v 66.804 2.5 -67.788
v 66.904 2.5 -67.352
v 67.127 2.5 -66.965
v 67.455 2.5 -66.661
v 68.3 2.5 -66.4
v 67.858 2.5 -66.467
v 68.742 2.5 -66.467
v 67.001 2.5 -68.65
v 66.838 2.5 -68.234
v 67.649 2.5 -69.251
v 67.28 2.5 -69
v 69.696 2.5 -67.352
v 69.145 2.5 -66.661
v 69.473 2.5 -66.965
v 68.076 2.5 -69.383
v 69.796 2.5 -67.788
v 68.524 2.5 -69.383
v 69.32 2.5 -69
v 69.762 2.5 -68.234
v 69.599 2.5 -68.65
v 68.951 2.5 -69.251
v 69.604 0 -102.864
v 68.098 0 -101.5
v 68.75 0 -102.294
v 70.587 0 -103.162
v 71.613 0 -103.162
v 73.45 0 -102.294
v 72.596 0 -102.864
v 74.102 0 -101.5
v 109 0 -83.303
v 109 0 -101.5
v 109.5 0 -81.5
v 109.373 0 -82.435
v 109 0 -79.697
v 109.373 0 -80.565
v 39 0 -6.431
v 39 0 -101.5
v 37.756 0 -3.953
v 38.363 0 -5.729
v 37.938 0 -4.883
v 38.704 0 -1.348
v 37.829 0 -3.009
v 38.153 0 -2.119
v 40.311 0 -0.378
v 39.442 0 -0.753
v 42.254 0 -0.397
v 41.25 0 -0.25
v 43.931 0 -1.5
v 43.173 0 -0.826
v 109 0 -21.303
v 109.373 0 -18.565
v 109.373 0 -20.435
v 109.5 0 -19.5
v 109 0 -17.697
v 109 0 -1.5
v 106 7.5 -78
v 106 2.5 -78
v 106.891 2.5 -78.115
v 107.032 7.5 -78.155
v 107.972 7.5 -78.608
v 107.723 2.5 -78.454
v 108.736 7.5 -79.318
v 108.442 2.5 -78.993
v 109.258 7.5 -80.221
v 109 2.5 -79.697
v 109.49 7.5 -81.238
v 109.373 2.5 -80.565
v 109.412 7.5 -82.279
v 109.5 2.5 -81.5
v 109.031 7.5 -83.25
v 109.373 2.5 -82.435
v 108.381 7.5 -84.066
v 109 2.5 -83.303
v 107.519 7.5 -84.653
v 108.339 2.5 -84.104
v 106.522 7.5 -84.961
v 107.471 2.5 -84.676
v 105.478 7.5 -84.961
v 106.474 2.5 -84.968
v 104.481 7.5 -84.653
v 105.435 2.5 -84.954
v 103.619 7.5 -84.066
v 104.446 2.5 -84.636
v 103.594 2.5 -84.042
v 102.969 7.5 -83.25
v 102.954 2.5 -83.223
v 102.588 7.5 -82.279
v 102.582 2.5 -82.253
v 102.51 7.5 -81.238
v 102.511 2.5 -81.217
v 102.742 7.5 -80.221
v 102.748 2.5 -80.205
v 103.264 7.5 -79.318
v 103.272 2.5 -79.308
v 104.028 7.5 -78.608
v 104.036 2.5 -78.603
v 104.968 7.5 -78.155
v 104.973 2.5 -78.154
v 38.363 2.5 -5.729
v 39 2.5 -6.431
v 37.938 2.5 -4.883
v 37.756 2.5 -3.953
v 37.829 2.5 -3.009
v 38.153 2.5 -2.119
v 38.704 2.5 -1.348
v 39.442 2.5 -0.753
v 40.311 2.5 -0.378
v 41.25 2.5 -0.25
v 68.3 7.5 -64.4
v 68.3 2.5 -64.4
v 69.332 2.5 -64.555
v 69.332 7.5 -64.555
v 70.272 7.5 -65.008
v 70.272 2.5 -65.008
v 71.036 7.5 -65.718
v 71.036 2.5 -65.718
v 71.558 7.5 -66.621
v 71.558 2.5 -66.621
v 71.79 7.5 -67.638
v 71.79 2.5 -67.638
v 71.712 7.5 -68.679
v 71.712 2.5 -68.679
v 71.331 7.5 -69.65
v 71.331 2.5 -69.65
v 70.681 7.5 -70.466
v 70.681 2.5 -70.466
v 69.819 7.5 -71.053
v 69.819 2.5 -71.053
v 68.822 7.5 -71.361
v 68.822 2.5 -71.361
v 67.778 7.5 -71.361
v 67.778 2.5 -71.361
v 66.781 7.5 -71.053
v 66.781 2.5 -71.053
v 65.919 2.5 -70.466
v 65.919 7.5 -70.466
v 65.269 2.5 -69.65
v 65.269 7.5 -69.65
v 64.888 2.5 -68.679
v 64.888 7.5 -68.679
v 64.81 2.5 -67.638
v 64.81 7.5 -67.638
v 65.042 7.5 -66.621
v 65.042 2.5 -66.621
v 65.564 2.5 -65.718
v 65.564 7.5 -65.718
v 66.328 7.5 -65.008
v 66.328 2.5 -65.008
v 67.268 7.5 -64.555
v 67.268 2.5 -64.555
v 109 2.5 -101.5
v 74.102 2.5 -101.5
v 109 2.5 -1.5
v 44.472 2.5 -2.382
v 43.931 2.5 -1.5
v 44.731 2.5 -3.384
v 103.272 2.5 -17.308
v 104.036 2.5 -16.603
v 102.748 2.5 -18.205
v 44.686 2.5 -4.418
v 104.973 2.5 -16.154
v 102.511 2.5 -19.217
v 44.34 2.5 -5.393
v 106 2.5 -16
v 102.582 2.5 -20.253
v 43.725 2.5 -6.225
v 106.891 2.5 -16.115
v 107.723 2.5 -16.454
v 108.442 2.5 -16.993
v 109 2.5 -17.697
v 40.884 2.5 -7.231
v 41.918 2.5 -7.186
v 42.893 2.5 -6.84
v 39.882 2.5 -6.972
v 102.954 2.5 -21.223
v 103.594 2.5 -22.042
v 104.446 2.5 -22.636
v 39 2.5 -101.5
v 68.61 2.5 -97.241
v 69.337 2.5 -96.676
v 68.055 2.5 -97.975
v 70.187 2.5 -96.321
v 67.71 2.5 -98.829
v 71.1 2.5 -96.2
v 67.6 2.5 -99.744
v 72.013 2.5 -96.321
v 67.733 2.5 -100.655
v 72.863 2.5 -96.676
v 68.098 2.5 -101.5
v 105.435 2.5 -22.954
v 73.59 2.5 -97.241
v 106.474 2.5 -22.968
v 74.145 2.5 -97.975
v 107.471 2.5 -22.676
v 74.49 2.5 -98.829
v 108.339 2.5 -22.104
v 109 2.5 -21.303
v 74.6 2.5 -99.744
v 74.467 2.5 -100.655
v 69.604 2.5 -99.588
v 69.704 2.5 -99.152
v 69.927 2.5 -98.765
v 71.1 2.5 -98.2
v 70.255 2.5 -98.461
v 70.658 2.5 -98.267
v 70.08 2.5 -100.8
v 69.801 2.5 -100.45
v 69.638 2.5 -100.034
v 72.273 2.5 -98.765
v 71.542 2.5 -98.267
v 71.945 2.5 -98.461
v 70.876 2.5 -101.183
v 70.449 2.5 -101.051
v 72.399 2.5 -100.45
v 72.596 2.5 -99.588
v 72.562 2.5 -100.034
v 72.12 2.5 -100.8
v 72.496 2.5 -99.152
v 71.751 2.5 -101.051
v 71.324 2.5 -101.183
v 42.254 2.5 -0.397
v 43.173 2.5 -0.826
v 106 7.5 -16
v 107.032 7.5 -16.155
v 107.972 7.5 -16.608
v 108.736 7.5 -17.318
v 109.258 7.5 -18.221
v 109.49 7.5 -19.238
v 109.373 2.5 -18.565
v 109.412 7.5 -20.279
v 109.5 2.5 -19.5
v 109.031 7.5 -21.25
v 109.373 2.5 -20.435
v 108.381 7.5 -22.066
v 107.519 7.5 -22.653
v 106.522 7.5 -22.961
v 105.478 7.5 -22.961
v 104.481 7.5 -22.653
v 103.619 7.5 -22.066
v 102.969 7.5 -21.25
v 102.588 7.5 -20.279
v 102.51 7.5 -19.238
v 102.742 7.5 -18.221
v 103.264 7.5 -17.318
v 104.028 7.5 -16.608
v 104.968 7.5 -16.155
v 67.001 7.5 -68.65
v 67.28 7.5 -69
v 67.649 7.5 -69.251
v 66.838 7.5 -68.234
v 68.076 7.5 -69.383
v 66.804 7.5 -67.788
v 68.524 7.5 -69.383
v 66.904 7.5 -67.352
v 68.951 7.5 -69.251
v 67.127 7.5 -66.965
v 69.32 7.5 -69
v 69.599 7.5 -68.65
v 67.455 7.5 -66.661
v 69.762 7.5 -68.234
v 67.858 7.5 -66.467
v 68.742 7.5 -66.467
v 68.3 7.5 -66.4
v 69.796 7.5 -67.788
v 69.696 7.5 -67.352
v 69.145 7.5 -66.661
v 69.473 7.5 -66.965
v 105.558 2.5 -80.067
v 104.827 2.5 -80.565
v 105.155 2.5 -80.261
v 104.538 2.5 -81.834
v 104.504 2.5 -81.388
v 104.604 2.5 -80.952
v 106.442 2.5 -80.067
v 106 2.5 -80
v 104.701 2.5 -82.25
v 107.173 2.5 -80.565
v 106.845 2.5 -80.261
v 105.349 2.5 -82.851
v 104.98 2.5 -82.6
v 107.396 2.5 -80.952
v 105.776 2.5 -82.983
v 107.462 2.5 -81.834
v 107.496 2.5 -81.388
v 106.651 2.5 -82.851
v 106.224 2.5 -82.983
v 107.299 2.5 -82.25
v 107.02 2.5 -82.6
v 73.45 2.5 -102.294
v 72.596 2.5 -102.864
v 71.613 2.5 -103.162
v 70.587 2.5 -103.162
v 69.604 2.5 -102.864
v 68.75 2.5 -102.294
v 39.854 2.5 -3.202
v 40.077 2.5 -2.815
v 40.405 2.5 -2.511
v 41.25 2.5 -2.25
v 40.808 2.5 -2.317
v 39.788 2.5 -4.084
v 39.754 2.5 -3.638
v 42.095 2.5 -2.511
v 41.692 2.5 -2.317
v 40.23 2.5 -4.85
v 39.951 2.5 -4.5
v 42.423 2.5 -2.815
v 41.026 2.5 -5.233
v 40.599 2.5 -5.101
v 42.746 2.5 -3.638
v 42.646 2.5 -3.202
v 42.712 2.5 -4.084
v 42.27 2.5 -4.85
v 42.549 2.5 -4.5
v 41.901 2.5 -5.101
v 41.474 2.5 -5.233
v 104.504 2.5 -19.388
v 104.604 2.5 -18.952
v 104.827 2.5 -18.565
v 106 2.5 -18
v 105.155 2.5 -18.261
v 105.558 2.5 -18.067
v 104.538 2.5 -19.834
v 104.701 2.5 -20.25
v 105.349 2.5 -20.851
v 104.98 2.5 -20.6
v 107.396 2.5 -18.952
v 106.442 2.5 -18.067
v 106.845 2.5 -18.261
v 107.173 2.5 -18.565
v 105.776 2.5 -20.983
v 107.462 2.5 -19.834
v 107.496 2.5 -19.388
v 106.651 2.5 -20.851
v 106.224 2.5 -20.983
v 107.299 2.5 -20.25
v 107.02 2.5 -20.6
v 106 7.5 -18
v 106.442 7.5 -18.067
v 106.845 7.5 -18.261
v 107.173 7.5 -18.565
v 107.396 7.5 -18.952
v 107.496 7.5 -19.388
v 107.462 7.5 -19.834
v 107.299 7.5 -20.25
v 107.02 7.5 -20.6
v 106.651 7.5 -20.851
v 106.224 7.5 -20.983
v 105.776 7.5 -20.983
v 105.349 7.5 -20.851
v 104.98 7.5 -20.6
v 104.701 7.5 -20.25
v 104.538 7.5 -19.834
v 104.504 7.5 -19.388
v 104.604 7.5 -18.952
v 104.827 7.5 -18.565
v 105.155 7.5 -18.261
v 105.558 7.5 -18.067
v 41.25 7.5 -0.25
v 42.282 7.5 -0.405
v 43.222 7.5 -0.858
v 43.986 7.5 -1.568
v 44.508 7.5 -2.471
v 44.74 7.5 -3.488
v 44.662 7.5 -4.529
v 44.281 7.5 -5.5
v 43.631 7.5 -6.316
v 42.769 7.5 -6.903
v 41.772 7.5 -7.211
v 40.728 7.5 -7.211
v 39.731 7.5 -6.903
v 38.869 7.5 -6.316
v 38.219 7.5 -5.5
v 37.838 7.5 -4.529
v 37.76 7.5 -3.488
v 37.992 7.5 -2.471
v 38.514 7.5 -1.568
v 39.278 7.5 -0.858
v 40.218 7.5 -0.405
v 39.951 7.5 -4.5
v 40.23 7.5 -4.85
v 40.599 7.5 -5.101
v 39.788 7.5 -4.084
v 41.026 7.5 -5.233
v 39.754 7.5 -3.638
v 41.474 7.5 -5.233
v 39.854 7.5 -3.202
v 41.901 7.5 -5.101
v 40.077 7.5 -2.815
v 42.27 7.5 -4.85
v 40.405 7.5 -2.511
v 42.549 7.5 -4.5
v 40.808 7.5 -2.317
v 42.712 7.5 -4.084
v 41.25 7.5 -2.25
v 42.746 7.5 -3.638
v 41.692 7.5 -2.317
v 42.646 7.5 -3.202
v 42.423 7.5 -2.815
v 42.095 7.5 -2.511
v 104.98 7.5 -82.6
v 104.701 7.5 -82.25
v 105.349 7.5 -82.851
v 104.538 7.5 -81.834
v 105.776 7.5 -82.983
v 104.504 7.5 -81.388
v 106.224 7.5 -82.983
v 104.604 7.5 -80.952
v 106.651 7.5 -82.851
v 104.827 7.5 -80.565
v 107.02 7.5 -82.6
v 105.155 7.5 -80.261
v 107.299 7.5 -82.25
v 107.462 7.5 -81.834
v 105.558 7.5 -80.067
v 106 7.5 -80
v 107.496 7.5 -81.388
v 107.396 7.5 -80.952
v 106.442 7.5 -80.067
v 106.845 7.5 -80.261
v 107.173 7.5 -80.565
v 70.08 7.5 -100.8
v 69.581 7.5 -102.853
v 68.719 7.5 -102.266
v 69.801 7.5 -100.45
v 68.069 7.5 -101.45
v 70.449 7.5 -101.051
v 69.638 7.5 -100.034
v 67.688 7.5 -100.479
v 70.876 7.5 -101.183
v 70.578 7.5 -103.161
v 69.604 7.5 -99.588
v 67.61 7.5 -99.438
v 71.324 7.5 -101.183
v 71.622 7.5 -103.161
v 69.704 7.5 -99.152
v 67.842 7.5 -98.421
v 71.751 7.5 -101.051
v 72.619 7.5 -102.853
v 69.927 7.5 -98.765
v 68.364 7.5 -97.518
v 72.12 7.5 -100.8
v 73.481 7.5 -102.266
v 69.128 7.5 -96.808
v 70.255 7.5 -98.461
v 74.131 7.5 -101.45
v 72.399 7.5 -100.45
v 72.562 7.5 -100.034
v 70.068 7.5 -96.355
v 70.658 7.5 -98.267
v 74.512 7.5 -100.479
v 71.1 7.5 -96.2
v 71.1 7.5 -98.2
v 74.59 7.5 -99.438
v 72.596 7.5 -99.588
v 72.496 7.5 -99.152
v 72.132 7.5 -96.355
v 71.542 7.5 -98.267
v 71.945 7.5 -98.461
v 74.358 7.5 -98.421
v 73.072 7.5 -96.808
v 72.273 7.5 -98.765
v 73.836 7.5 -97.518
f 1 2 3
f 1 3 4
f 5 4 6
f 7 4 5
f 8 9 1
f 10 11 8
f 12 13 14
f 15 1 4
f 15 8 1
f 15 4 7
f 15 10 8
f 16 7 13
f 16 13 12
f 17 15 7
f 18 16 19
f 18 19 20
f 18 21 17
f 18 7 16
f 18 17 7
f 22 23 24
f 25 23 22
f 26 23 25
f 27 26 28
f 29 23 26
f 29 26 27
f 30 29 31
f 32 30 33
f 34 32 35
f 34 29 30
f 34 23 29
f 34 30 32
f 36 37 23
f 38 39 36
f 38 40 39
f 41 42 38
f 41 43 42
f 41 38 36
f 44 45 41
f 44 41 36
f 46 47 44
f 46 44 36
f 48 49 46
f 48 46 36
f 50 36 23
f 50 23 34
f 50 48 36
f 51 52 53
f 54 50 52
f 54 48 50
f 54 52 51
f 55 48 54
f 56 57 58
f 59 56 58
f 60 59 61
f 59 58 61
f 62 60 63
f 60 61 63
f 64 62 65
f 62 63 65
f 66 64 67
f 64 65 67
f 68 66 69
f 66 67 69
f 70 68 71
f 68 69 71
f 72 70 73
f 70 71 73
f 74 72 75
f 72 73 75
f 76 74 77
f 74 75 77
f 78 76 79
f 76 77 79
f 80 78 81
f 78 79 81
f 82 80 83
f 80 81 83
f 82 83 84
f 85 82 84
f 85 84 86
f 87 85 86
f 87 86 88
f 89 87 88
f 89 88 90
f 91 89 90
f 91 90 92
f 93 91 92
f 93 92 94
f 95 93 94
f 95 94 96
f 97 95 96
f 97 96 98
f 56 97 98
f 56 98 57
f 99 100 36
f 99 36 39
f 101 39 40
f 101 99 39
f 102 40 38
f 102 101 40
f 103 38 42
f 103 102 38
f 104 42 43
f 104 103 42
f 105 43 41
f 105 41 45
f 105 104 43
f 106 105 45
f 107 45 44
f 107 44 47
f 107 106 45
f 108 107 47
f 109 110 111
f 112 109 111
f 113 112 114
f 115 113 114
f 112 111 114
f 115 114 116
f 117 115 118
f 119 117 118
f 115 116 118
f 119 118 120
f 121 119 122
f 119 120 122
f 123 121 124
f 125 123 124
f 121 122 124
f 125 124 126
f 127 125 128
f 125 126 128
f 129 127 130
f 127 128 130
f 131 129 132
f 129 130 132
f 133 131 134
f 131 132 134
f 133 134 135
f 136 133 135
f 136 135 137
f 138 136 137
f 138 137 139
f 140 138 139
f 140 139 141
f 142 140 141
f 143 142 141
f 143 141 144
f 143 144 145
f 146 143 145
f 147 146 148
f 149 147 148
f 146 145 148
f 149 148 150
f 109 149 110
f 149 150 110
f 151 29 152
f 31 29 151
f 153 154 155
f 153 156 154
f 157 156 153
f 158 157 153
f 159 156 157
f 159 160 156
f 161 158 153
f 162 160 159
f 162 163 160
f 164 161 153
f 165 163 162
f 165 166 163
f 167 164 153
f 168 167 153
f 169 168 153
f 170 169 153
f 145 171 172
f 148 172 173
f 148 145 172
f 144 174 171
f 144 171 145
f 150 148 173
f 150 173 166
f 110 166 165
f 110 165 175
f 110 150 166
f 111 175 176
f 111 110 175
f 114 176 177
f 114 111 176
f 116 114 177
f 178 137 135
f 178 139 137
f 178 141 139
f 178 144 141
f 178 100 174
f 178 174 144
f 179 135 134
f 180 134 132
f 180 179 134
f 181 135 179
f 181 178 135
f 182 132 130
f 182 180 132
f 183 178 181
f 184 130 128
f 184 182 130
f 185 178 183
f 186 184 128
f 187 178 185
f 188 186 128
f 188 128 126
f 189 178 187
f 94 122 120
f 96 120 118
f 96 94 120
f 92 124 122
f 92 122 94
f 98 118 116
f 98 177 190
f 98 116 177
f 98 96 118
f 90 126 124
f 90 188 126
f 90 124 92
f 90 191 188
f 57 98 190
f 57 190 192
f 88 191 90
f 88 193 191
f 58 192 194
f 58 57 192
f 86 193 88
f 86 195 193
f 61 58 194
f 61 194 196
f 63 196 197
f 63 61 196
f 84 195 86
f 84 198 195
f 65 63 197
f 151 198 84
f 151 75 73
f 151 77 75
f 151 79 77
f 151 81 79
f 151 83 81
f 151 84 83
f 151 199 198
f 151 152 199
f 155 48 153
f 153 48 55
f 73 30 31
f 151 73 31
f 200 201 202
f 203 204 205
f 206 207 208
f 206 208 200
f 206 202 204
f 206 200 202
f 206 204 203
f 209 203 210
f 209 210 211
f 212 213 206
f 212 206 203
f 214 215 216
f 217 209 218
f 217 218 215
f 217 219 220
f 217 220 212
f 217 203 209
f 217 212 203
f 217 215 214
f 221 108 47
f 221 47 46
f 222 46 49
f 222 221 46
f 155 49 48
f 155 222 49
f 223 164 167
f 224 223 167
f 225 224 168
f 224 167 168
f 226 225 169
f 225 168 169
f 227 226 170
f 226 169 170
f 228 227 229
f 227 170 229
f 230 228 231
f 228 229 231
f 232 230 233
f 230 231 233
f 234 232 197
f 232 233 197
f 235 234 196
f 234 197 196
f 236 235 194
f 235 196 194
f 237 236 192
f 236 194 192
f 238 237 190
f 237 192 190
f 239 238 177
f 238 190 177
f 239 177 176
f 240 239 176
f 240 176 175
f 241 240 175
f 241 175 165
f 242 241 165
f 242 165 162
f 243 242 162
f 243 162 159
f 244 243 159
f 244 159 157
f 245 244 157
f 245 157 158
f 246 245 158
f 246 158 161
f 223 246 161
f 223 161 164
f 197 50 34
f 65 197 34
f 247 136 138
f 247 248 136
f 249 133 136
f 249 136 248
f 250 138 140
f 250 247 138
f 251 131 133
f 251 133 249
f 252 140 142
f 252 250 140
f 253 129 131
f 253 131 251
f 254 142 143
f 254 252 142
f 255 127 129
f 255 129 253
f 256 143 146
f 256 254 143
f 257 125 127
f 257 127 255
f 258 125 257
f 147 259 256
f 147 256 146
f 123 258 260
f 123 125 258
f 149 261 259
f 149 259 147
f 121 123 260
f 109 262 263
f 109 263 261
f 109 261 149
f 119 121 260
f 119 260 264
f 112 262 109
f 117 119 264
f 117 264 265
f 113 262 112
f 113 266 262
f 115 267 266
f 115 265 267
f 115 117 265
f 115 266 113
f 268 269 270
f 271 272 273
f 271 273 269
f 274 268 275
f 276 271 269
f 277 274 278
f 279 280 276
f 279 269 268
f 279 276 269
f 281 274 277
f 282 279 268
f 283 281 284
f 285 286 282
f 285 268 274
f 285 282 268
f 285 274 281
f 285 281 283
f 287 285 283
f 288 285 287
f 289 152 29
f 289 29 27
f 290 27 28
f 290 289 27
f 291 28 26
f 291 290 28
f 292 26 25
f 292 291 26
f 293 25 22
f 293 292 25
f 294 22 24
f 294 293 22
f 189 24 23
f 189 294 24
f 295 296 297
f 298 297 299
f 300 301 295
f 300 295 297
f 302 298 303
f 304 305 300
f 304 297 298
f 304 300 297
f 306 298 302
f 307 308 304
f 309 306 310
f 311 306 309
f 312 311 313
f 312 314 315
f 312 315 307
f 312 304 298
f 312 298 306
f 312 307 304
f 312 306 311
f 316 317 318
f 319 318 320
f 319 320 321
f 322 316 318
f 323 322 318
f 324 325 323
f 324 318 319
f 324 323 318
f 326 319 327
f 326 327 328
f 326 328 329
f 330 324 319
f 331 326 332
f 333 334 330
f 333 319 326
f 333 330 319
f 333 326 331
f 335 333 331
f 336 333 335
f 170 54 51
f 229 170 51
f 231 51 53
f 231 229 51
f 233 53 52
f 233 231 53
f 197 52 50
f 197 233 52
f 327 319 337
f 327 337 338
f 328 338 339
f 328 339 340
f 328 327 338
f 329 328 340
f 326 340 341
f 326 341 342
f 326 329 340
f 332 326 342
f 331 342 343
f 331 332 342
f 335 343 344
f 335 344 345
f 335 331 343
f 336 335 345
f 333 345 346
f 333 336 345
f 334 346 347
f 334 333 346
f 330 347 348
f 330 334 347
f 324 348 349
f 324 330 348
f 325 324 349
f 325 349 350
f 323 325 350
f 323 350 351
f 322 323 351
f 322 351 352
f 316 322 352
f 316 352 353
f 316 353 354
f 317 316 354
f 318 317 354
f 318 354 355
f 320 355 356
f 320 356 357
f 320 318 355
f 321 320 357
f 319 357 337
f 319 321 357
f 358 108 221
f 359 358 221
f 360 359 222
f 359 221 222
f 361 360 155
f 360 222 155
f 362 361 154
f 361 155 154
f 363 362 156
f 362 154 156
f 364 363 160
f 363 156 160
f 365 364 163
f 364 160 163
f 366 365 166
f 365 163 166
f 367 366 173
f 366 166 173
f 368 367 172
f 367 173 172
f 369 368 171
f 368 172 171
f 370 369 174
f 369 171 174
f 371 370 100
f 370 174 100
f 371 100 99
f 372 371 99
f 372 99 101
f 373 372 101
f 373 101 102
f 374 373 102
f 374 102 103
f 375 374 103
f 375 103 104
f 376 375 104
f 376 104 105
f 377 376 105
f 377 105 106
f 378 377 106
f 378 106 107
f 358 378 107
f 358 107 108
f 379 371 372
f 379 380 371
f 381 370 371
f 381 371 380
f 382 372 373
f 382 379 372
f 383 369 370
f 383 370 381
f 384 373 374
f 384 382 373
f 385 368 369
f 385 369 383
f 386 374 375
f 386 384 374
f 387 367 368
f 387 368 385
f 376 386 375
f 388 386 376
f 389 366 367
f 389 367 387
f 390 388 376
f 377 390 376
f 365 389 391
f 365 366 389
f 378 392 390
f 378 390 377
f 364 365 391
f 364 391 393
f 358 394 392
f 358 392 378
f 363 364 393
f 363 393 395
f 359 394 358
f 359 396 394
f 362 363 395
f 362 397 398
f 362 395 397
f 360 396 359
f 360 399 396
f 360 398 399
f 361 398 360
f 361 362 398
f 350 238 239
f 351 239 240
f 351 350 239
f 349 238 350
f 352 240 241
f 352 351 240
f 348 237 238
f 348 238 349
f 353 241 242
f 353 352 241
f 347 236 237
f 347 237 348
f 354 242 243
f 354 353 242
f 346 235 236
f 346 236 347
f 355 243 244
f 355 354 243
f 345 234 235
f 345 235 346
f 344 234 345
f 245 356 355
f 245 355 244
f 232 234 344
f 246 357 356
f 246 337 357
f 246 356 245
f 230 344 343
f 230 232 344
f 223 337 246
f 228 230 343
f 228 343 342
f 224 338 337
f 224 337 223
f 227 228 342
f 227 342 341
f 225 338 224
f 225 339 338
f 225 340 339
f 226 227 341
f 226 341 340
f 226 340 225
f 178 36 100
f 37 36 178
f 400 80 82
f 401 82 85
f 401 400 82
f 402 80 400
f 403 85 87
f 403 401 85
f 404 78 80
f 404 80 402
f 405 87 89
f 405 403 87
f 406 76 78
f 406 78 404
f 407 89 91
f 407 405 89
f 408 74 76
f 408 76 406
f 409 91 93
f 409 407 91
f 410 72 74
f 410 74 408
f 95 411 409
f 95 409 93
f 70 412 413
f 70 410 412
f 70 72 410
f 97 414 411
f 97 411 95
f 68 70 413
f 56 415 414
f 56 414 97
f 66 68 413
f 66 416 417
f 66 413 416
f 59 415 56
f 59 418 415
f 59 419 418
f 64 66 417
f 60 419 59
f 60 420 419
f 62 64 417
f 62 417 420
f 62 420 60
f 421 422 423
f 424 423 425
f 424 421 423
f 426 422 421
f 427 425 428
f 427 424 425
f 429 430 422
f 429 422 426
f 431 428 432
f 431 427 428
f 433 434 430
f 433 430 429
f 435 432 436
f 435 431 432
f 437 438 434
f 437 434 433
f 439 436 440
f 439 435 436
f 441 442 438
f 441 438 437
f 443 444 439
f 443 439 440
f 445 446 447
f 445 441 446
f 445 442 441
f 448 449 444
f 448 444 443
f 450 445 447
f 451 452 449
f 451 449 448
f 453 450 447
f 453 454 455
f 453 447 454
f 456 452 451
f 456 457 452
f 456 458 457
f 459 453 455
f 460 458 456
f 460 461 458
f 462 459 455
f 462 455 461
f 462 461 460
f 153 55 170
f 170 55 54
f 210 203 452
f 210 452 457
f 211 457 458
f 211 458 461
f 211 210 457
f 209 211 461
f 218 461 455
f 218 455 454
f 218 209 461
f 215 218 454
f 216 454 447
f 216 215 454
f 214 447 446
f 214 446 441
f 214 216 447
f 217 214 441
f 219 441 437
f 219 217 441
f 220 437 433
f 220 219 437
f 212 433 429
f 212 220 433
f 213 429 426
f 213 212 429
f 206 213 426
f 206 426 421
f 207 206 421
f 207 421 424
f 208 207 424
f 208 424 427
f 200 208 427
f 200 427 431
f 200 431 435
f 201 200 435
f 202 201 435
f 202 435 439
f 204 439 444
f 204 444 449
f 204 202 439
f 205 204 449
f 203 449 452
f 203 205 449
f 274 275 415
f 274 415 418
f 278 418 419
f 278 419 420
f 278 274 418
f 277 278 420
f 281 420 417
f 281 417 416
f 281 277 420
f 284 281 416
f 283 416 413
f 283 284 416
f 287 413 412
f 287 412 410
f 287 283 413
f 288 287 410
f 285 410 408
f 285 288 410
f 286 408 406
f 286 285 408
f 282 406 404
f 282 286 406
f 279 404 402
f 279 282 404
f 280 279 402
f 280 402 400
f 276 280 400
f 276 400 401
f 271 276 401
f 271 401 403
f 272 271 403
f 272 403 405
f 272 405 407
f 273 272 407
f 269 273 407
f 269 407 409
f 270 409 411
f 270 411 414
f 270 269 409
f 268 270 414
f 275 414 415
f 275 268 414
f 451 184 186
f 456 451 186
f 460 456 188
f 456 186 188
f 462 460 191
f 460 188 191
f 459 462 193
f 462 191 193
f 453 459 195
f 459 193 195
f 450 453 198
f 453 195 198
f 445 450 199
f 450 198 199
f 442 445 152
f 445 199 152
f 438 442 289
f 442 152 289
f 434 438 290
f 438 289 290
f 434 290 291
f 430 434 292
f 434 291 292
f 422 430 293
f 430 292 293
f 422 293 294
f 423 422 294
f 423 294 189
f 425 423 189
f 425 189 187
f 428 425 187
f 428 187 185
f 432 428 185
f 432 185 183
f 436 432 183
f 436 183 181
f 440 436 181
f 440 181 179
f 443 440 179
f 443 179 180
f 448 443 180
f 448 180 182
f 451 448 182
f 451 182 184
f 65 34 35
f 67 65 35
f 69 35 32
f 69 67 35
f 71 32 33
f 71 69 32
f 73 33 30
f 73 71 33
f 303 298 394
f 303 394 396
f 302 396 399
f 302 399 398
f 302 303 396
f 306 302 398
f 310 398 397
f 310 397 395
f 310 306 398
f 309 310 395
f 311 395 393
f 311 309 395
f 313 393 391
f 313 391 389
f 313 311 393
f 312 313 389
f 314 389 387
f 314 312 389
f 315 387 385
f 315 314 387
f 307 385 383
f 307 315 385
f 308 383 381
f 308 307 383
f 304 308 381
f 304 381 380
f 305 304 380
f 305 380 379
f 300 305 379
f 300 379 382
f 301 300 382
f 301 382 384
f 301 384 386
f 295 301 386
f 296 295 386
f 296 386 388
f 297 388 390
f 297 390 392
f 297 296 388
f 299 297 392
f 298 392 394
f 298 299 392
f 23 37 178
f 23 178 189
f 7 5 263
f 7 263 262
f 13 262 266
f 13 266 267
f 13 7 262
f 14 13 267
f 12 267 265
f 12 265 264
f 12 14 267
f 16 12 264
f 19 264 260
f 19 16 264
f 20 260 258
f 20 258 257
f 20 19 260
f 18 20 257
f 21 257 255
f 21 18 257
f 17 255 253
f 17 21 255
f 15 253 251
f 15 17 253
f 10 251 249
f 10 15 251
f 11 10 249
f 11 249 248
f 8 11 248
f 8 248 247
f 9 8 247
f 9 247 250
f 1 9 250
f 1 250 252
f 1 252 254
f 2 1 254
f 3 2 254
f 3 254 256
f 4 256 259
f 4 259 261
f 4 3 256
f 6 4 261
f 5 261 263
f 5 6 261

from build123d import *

# Parameters (mm, degrees)
SKETCH2_W                       = 70
SKETCH2_H                       = 100
BOSS_EXTRUDE1_DEPTH             = 2.5
SKETCH3_R                       = 3.5
SKETCH3_R_2                     = 1.5
BOSS_EXTRUDE2_DEPTH             = 5
BOSS_EXTRUDE2_DIRECTION_2_REACH = 150.961


with BuildPart() as part:
    # Sketch2 → Boss-Extrude1 (new body)
    with BuildSketch(Plane(origin=(0, 0, 0), x_dir=(1, 0, 0), z_dir=(0, 1, 0))):
        with Locations((74, 51.5)):
            Rectangle(SKETCH2_W, SKETCH2_H)
    extrude(amount=BOSS_EXTRUDE1_DEPTH)

    # Sketch3 → Boss-Extrude2 (add)
    # profile 1 of 5: a face of its own
    with BuildSketch(Plane(origin=(0, 2.5, 0), x_dir=(1, 0, 0), z_dir=(0, 1, 0))):
        with Locations(Location((41.25, 3.75, 0), (0, 0, 270))):
            Circle(SKETCH3_R)
        with Locations(Location((41.25, 3.75, 0), (0, 0, 270))):
            Circle(SKETCH3_R_2, mode=Mode.SUBTRACT)
    # profile 2 of 5: a face of its own
    with BuildSketch(Plane(origin=(0, 2.5, 0), x_dir=(1, 0, 0), z_dir=(0, 1, 0))):
        with Locations(Location((106, 19.5, 0), (0, 0, 270))):
            Circle(SKETCH3_R)
        with Locations(Location((106, 19.5, 0), (0, 0, 270))):
            Circle(SKETCH3_R_2, mode=Mode.SUBTRACT)
    # profile 3 of 5: a face of its own
    with BuildSketch(Plane(origin=(0, 2.5, 0), x_dir=(1, 0, 0), z_dir=(0, 1, 0))):
        with Locations(Location((106, 81.5, 0), (0, 0, 270))):
            Circle(SKETCH3_R)
        with Locations(Location((106, 81.5, 0), (0, 0, 270))):
            Circle(SKETCH3_R_2, mode=Mode.SUBTRACT)
    # profile 4 of 5: a face of its own
    with BuildSketch(Plane(origin=(0, 2.5, 0), x_dir=(1, 0, 0), z_dir=(0, 1, 0))):
        with Locations(Location((68.3, 67.9, 0), (0, 0, 270))):
            Circle(SKETCH3_R)
        with Locations(Location((68.3, 67.9, 0), (0, 0, 270))):
            Circle(SKETCH3_R_2, mode=Mode.SUBTRACT)
    # profile 5 of 5: a face of its own
    with BuildSketch(Plane(origin=(0, 2.5, 0), x_dir=(1, 0, 0), z_dir=(0, 1, 0))):
        with Locations(Location((71.1, 99.7, 0), (0, 0, 270))):
            Circle(SKETCH3_R)
        with Locations(Location((71.1, 99.7, 0), (0, 0, 270))):
            Circle(SKETCH3_R_2, mode=Mode.SUBTRACT)
    extrude(amount=BOSS_EXTRUDE2_DEPTH)

    # Boss-Extrude2 direction 2: up to this face of the body (flat: up to its plane)
    boss_extrude2_direction_2_end = Plane(part.part.faces().sort_by_distance((74, 0, -51.5))[0])
    # Sketch3 → Boss-Extrude2 direction 2 (add, up to the picked face)
    with BuildSketch(Plane(origin=(0, 2.5, 0), x_dir=(1, 0, 0), z_dir=(0, 1, 0)), mode=Mode.PRIVATE) as boss_extrude2_direction_2_sk1:
        with Locations(Location((41.25, 3.75, 0), (0, 0, 270))):
            Circle(SKETCH3_R)
        with Locations(Location((41.25, 3.75, 0), (0, 0, 270))):
            Circle(SKETCH3_R_2, mode=Mode.SUBTRACT)
    boss_extrude2_direction_2_tool1 = split(extrude(boss_extrude2_direction_2_sk1.sketch, amount=-BOSS_EXTRUDE2_DIRECTION_2_REACH, mode=Mode.PRIVATE), bisect_by=boss_extrude2_direction_2_end, keep=Keep.BOTH, mode=Mode.PRIVATE)
    # Sketch3 → Boss-Extrude2 direction 2 (add, up to the picked face)
    with BuildSketch(Plane(origin=(0, 2.5, 0), x_dir=(1, 0, 0), z_dir=(0, 1, 0)), mode=Mode.PRIVATE) as boss_extrude2_direction_2_sk2:
        with Locations(Location((106, 19.5, 0), (0, 0, 270))):
            Circle(SKETCH3_R)
        with Locations(Location((106, 19.5, 0), (0, 0, 270))):
            Circle(SKETCH3_R_2, mode=Mode.SUBTRACT)
    boss_extrude2_direction_2_tool2 = split(extrude(boss_extrude2_direction_2_sk2.sketch, amount=-BOSS_EXTRUDE2_DIRECTION_2_REACH, mode=Mode.PRIVATE), bisect_by=boss_extrude2_direction_2_end, keep=Keep.BOTH, mode=Mode.PRIVATE)
    # Sketch3 → Boss-Extrude2 direction 2 (add, up to the picked face)
    with BuildSketch(Plane(origin=(0, 2.5, 0), x_dir=(1, 0, 0), z_dir=(0, 1, 0)), mode=Mode.PRIVATE) as boss_extrude2_direction_2_sk3:
        with Locations(Location((106, 81.5, 0), (0, 0, 270))):
            Circle(SKETCH3_R)
        with Locations(Location((106, 81.5, 0), (0, 0, 270))):
            Circle(SKETCH3_R_2, mode=Mode.SUBTRACT)
    boss_extrude2_direction_2_tool3 = split(extrude(boss_extrude2_direction_2_sk3.sketch, amount=-BOSS_EXTRUDE2_DIRECTION_2_REACH, mode=Mode.PRIVATE), bisect_by=boss_extrude2_direction_2_end, keep=Keep.BOTH, mode=Mode.PRIVATE)
    # Sketch3 → Boss-Extrude2 direction 2 (add, up to the picked face)
    with BuildSketch(Plane(origin=(0, 2.5, 0), x_dir=(1, 0, 0), z_dir=(0, 1, 0)), mode=Mode.PRIVATE) as boss_extrude2_direction_2_sk4:
        with Locations(Location((68.3, 67.9, 0), (0, 0, 270))):
            Circle(SKETCH3_R)
        with Locations(Location((68.3, 67.9, 0), (0, 0, 270))):
            Circle(SKETCH3_R_2, mode=Mode.SUBTRACT)
    boss_extrude2_direction_2_tool4 = split(extrude(boss_extrude2_direction_2_sk4.sketch, amount=-BOSS_EXTRUDE2_DIRECTION_2_REACH, mode=Mode.PRIVATE), bisect_by=boss_extrude2_direction_2_end, keep=Keep.BOTH, mode=Mode.PRIVATE)
    # Sketch3 → Boss-Extrude2 direction 2 (add, up to the picked face)
    with BuildSketch(Plane(origin=(0, 2.5, 0), x_dir=(1, 0, 0), z_dir=(0, 1, 0)), mode=Mode.PRIVATE) as boss_extrude2_direction_2_sk5:
        with Locations(Location((71.1, 99.7, 0), (0, 0, 270))):
            Circle(SKETCH3_R)
        with Locations(Location((71.1, 99.7, 0), (0, 0, 270))):
            Circle(SKETCH3_R_2, mode=Mode.SUBTRACT)
    boss_extrude2_direction_2_tool5 = split(extrude(boss_extrude2_direction_2_sk5.sketch, amount=-BOSS_EXTRUDE2_DIRECTION_2_REACH, mode=Mode.PRIVATE), bisect_by=boss_extrude2_direction_2_end, keep=Keep.BOTH, mode=Mode.PRIVATE)
    add(boss_extrude2_direction_2_tool1.solids().sort_by(Axis((41.25, 2.5, -7.151005), (0, -1, 0)))[0])
    add(boss_extrude2_direction_2_tool2.solids().sort_by(Axis((106, 2.5, -22.901005), (0, -1, 0)))[0])
    add(boss_extrude2_direction_2_tool3.solids().sort_by(Axis((106, 2.5, -84.901005), (0, -1, 0)))[0])
    add(boss_extrude2_direction_2_tool4.solids().sort_by(Axis((68.3, 2.5, -71.301005), (0, -1, 0)))[0])
    add(boss_extrude2_direction_2_tool5.solids().sort_by(Axis((71.1, 2.5, -103.101005), (0, -1, 0)))[0])


solid = part.part
